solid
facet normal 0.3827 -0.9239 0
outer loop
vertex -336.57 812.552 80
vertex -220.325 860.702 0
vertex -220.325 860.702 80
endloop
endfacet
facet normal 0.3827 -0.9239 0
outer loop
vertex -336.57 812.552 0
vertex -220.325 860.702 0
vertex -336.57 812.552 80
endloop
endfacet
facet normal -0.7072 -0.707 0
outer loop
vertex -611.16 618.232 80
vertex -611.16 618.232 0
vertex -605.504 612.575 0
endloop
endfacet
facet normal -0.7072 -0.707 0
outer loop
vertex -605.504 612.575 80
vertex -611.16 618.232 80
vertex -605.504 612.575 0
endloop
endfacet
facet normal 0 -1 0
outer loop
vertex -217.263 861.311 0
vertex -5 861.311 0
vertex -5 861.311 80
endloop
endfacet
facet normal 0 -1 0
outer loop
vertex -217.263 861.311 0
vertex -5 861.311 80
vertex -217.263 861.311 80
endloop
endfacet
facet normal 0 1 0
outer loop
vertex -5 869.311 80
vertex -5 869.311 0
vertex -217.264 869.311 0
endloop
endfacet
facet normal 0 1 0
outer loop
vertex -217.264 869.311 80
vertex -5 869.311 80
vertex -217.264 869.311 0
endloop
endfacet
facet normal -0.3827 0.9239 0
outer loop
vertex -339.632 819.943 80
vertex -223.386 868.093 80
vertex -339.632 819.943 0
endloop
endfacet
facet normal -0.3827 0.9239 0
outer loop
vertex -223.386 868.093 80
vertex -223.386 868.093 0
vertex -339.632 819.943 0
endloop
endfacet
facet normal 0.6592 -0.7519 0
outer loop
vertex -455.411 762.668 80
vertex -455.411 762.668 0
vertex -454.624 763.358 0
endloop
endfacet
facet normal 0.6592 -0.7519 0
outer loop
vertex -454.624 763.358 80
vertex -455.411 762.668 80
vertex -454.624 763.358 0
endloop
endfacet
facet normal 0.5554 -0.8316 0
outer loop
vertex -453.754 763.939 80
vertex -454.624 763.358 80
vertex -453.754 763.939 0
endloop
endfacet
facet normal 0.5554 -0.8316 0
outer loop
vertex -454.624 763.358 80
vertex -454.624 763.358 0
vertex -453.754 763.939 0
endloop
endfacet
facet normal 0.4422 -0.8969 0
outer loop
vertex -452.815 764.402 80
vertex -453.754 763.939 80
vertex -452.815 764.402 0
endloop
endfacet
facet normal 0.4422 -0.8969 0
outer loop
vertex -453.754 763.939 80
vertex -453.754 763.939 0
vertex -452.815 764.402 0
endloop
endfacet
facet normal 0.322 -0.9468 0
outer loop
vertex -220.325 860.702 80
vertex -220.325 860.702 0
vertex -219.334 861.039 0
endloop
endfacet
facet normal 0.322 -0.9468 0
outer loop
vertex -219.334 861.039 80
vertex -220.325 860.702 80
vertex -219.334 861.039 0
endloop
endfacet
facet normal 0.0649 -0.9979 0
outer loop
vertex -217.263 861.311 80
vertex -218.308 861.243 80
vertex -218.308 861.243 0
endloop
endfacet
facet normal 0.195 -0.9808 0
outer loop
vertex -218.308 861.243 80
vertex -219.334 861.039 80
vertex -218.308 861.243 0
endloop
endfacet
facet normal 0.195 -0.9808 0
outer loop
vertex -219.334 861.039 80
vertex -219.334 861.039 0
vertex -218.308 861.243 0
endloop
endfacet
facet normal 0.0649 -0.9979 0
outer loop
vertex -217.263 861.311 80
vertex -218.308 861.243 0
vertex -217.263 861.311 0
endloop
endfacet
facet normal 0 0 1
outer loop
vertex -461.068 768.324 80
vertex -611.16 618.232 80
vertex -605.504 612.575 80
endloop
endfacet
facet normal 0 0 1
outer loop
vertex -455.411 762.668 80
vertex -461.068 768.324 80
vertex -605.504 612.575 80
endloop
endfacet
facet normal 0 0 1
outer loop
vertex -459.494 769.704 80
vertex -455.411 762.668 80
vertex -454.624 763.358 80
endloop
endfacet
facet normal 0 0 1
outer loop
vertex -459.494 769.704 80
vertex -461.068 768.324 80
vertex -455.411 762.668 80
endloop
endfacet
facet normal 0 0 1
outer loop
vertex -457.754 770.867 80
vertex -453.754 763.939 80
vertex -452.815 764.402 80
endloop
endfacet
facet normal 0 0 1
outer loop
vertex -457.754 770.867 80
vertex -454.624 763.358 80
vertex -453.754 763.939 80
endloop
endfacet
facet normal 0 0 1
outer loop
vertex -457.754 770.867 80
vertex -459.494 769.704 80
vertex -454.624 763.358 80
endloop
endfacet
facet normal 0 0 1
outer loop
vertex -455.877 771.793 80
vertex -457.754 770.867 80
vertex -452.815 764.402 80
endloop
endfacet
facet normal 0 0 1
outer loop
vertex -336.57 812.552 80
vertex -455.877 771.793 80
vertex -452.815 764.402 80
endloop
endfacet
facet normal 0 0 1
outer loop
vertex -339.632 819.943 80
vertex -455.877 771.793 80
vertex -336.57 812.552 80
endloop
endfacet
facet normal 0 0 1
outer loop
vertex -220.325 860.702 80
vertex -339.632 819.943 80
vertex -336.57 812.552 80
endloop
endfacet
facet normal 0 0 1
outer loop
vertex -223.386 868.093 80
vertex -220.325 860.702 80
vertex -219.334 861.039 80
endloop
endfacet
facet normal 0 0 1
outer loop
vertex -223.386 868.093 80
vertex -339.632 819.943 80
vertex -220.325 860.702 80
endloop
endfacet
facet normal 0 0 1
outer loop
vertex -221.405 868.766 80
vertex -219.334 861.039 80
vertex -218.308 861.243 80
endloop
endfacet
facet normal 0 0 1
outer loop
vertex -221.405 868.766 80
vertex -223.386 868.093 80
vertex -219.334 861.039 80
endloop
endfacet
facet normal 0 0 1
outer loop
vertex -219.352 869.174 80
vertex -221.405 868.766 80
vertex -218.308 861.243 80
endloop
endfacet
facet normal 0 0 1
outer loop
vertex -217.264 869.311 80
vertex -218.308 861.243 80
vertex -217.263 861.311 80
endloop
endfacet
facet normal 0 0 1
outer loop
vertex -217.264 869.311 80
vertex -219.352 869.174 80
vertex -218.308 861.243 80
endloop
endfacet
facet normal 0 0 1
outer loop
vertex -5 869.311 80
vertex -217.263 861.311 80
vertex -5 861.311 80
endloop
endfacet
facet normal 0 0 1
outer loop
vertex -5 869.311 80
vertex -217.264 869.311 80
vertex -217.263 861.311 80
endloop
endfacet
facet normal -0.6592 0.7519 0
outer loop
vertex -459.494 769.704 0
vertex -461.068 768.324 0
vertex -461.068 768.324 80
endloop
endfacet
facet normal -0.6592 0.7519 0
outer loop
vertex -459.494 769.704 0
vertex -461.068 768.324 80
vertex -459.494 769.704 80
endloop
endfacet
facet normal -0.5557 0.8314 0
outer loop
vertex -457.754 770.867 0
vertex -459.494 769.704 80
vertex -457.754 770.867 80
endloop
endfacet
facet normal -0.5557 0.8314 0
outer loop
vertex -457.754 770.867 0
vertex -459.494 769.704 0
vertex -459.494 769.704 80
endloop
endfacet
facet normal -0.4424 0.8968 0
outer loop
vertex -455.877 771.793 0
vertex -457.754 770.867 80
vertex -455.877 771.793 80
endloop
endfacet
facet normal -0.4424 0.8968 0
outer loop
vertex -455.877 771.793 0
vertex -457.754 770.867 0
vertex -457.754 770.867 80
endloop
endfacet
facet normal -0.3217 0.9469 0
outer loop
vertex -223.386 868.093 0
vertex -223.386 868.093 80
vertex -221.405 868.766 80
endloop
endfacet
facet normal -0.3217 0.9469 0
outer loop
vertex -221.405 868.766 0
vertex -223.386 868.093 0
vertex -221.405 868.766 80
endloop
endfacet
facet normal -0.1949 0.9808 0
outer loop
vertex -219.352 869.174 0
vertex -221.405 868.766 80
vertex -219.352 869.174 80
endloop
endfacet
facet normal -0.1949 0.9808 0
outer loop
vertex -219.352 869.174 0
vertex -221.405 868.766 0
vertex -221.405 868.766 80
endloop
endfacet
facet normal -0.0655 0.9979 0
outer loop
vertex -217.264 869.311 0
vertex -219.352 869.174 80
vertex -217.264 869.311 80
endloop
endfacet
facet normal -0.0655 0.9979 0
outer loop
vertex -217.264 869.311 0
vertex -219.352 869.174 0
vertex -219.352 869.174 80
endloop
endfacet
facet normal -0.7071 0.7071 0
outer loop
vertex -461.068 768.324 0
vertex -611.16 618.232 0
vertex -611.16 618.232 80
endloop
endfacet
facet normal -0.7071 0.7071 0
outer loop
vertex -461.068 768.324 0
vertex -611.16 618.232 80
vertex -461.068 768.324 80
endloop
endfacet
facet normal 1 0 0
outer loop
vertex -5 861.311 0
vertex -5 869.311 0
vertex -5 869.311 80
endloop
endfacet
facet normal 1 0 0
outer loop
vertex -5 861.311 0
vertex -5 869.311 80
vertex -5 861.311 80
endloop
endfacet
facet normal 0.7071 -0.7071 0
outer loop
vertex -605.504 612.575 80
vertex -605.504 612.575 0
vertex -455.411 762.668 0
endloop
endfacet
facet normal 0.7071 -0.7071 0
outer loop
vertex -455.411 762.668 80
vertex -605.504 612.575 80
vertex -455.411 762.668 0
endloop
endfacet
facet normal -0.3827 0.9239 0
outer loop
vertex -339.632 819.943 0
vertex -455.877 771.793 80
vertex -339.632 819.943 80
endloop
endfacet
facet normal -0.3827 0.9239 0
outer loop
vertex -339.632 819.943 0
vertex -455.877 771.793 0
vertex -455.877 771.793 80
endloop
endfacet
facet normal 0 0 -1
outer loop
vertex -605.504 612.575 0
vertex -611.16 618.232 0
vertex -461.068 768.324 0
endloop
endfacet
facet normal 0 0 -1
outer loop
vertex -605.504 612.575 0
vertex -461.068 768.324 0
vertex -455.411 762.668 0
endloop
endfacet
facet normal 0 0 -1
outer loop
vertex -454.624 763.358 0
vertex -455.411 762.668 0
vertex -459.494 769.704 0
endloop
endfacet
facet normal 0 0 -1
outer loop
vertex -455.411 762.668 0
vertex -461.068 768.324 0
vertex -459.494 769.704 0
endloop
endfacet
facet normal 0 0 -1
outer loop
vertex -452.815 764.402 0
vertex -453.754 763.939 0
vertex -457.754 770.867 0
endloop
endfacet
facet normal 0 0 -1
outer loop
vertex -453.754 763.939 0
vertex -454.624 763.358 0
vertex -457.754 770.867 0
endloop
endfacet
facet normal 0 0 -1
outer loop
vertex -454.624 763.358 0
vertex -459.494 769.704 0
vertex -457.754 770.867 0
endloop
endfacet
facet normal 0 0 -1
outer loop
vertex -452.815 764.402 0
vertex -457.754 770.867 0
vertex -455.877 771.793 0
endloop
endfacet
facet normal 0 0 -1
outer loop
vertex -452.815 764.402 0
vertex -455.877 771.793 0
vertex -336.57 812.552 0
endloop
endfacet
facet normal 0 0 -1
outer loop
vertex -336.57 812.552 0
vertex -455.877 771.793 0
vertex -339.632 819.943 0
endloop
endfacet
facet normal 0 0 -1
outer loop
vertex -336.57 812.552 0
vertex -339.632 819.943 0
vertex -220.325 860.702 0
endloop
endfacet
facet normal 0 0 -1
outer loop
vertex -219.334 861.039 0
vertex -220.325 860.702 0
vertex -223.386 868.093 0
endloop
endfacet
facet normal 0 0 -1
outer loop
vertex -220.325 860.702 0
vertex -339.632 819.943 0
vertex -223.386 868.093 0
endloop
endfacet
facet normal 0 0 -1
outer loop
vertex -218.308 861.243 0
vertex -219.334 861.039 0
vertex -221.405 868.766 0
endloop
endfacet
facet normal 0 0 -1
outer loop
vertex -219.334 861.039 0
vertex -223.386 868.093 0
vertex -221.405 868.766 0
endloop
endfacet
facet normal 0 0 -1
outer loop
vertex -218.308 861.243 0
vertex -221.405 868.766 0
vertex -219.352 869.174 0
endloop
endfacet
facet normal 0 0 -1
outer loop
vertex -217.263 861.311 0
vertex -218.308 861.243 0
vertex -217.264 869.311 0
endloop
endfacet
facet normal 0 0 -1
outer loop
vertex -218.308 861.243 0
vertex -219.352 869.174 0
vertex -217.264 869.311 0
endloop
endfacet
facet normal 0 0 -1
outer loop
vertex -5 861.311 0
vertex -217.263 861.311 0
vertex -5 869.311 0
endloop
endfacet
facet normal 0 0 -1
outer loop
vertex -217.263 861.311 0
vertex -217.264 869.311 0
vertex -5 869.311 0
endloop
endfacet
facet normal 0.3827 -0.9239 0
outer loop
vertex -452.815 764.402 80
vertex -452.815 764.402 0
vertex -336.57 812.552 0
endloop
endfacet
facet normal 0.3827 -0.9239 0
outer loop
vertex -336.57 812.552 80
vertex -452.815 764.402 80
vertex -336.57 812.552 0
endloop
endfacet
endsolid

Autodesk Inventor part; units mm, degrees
ref_plane "YZ Plane" through (0, 0, 0) normal (1, 0, 0) x (0, 1, 0)
ref_plane "XZ Plane" through (0, 0, 0) normal (0, 1, 0) x (-1, 0, 0)
ref_plane "XY Plane" through (0, 0, 0) normal (0, 0, 1) x (1, 0, 0)
sketch "Sketch2" plane through (0, 0, 0) normal (0, 0, 1) x (1, 0, 0)
  line L0 (0, 278.716) -> (197.082, 197.082) construction
  line L1 (197.082, 197.082) -> (278.716, 0) construction
  line L2 (278.716, 0) -> (197.082, -197.082) construction
  line L3 (197.082, -197.082) -> (0, -278.716) construction
  line L4 (0, -278.716) -> (-197.082, -197.082) construction
  line L5 (-197.082, -197.082) -> (-278.716, 0) construction
  line L6 (-278.716, 0) -> (-197.082, 197.082) construction
  line L7 (-197.082, 197.082) -> (0, 278.716) construction
  line L8 (-197.082, 197.082) -> (0, 278.716) construction
  line L9 (-461.6493, 774.8136) -> (-221.4406, 874.3113) construction
  line L10 (-98.541, 237.899) -> (-341.545, 824.5625) construction
  line L11 (-221.4406, 874.3113) -> (0, 874.3113) construction
  line L12 (0, 874.3113) -> (0, 278.716) construction
  line L13 (-461.6493, 774.8136) -> (-618.2315, 618.2315) construction
  line L14 (-618.2315, 618.2315) -> (-197.082, 197.082) construction
  line L15 (-223.3864, 868.0934) -> (-339.6315, 819.9431)
  line L16 (-5, 869.3113) -> (-217.2635, 869.3113)
  line L17 (-455.8767, 771.7928) -> (-339.6315, 819.9431)
  line L18 (-611.1604, 618.2315) -> (-461.0675, 768.3244)
  arc A0 (-217.2635, 869.3113) -> (-223.3864, 868.0934) centre (-217.2635, 853.3113) ccw
  arc A1 (-455.8767, 771.7928) -> (-461.0675, 768.3244) centre (-449.7538, 757.0107) ccw
  point P0 (0, 0)
  point P1 (0, 0)
  point P2 (0, 0)
  point P3 (-220.4461, 869.3113)
  point P4 (-458.817, 770.5748)
  dimension "d0" = 515
  dimension "d1" = 260
  dimension "d2" = 635
  dimension "d6" = 5
  dimension "d10" = 5
  dimension "d14" = 5
  dimension "d15" = 16
contour flange "Contour Flange1" sketch "Sketch2" thickness 8 bend radius 8 width 80 along (0, 0, 1) mid plane no both sides no wall seen from (-111.1317, 869.3113, 0) lies toward (0, -1, 0) curves L16 A0 L15 L17 A1 L18
bend "Bend1"
corner "Corner1"
sketch "Sketch3" plane through (-455.8767, 771.7928, 80) normal (-0.3826834, 0.9238795, 0) x (0.9238795, 0.3826834, 0)
  line L0 (125.8228, 80) -> (125.8228, 0) construction
  line L1 (0, 0) -> (251.6457, 0) projected
  circle A0 centre (43.3228, 40) radius 10
  circle A1 centre (208.3228, 40) radius 10
  point P0 (125.8228, 40)
  dimension "d27" = 20
  dimension "d28" = 82.5
extrude "Extrusion1" [suppressed]
equation "\"d0\" = Барабан_размер_по_плоскостям"
equation "\"d1\" = Кассета_длина_грани"
equation "\"d2\" = Кассета_высота"
equation "\"d10\" = d6"
equation "\"d15\" = BendRadius + Thickness"
equation "\"d16\" = Thickness"
equation "\"d17\" = BendReliefWidth"
equation "\"d18\" = BendReliefDepth"
equation "\"d19\" = MinimumRemnant"
equation "\"d20\" = TransitionRadius"
equation "\"d22\" = BendRadius"
equation "\"d24\" = CornerReliefSize"
equation "\"d25\" = GapSize"
equation "\"d26\" = JacobiRadiusSize"
equation "\"BendRadius\" = Thickness"
equation "\"BendReliefWidth\" = Thickness"
equation "\"BendReliefDepth\" = 0.5 * Thickness"
equation "\"CornerReliefSize\" = 4 * Thickness"
equation "\"MinimumRemnant\" = 2 * Thickness"
equation "\"TransitionRadius\" = BendRadius"
equation "\"JacobiRadiusSize\" = BendRadius"
equation "\"GapSize\" = Thickness"
equation "\"Барабан_размер_по_плоскостям\" = 515"
equation "\"Кассета_длина_грани\" = 260"
equation "\"Кассета_высота\" = 635"
equation "\"Thickness\" = 8"
properties part number "DMF 01 52 Top sheet v2.1"
